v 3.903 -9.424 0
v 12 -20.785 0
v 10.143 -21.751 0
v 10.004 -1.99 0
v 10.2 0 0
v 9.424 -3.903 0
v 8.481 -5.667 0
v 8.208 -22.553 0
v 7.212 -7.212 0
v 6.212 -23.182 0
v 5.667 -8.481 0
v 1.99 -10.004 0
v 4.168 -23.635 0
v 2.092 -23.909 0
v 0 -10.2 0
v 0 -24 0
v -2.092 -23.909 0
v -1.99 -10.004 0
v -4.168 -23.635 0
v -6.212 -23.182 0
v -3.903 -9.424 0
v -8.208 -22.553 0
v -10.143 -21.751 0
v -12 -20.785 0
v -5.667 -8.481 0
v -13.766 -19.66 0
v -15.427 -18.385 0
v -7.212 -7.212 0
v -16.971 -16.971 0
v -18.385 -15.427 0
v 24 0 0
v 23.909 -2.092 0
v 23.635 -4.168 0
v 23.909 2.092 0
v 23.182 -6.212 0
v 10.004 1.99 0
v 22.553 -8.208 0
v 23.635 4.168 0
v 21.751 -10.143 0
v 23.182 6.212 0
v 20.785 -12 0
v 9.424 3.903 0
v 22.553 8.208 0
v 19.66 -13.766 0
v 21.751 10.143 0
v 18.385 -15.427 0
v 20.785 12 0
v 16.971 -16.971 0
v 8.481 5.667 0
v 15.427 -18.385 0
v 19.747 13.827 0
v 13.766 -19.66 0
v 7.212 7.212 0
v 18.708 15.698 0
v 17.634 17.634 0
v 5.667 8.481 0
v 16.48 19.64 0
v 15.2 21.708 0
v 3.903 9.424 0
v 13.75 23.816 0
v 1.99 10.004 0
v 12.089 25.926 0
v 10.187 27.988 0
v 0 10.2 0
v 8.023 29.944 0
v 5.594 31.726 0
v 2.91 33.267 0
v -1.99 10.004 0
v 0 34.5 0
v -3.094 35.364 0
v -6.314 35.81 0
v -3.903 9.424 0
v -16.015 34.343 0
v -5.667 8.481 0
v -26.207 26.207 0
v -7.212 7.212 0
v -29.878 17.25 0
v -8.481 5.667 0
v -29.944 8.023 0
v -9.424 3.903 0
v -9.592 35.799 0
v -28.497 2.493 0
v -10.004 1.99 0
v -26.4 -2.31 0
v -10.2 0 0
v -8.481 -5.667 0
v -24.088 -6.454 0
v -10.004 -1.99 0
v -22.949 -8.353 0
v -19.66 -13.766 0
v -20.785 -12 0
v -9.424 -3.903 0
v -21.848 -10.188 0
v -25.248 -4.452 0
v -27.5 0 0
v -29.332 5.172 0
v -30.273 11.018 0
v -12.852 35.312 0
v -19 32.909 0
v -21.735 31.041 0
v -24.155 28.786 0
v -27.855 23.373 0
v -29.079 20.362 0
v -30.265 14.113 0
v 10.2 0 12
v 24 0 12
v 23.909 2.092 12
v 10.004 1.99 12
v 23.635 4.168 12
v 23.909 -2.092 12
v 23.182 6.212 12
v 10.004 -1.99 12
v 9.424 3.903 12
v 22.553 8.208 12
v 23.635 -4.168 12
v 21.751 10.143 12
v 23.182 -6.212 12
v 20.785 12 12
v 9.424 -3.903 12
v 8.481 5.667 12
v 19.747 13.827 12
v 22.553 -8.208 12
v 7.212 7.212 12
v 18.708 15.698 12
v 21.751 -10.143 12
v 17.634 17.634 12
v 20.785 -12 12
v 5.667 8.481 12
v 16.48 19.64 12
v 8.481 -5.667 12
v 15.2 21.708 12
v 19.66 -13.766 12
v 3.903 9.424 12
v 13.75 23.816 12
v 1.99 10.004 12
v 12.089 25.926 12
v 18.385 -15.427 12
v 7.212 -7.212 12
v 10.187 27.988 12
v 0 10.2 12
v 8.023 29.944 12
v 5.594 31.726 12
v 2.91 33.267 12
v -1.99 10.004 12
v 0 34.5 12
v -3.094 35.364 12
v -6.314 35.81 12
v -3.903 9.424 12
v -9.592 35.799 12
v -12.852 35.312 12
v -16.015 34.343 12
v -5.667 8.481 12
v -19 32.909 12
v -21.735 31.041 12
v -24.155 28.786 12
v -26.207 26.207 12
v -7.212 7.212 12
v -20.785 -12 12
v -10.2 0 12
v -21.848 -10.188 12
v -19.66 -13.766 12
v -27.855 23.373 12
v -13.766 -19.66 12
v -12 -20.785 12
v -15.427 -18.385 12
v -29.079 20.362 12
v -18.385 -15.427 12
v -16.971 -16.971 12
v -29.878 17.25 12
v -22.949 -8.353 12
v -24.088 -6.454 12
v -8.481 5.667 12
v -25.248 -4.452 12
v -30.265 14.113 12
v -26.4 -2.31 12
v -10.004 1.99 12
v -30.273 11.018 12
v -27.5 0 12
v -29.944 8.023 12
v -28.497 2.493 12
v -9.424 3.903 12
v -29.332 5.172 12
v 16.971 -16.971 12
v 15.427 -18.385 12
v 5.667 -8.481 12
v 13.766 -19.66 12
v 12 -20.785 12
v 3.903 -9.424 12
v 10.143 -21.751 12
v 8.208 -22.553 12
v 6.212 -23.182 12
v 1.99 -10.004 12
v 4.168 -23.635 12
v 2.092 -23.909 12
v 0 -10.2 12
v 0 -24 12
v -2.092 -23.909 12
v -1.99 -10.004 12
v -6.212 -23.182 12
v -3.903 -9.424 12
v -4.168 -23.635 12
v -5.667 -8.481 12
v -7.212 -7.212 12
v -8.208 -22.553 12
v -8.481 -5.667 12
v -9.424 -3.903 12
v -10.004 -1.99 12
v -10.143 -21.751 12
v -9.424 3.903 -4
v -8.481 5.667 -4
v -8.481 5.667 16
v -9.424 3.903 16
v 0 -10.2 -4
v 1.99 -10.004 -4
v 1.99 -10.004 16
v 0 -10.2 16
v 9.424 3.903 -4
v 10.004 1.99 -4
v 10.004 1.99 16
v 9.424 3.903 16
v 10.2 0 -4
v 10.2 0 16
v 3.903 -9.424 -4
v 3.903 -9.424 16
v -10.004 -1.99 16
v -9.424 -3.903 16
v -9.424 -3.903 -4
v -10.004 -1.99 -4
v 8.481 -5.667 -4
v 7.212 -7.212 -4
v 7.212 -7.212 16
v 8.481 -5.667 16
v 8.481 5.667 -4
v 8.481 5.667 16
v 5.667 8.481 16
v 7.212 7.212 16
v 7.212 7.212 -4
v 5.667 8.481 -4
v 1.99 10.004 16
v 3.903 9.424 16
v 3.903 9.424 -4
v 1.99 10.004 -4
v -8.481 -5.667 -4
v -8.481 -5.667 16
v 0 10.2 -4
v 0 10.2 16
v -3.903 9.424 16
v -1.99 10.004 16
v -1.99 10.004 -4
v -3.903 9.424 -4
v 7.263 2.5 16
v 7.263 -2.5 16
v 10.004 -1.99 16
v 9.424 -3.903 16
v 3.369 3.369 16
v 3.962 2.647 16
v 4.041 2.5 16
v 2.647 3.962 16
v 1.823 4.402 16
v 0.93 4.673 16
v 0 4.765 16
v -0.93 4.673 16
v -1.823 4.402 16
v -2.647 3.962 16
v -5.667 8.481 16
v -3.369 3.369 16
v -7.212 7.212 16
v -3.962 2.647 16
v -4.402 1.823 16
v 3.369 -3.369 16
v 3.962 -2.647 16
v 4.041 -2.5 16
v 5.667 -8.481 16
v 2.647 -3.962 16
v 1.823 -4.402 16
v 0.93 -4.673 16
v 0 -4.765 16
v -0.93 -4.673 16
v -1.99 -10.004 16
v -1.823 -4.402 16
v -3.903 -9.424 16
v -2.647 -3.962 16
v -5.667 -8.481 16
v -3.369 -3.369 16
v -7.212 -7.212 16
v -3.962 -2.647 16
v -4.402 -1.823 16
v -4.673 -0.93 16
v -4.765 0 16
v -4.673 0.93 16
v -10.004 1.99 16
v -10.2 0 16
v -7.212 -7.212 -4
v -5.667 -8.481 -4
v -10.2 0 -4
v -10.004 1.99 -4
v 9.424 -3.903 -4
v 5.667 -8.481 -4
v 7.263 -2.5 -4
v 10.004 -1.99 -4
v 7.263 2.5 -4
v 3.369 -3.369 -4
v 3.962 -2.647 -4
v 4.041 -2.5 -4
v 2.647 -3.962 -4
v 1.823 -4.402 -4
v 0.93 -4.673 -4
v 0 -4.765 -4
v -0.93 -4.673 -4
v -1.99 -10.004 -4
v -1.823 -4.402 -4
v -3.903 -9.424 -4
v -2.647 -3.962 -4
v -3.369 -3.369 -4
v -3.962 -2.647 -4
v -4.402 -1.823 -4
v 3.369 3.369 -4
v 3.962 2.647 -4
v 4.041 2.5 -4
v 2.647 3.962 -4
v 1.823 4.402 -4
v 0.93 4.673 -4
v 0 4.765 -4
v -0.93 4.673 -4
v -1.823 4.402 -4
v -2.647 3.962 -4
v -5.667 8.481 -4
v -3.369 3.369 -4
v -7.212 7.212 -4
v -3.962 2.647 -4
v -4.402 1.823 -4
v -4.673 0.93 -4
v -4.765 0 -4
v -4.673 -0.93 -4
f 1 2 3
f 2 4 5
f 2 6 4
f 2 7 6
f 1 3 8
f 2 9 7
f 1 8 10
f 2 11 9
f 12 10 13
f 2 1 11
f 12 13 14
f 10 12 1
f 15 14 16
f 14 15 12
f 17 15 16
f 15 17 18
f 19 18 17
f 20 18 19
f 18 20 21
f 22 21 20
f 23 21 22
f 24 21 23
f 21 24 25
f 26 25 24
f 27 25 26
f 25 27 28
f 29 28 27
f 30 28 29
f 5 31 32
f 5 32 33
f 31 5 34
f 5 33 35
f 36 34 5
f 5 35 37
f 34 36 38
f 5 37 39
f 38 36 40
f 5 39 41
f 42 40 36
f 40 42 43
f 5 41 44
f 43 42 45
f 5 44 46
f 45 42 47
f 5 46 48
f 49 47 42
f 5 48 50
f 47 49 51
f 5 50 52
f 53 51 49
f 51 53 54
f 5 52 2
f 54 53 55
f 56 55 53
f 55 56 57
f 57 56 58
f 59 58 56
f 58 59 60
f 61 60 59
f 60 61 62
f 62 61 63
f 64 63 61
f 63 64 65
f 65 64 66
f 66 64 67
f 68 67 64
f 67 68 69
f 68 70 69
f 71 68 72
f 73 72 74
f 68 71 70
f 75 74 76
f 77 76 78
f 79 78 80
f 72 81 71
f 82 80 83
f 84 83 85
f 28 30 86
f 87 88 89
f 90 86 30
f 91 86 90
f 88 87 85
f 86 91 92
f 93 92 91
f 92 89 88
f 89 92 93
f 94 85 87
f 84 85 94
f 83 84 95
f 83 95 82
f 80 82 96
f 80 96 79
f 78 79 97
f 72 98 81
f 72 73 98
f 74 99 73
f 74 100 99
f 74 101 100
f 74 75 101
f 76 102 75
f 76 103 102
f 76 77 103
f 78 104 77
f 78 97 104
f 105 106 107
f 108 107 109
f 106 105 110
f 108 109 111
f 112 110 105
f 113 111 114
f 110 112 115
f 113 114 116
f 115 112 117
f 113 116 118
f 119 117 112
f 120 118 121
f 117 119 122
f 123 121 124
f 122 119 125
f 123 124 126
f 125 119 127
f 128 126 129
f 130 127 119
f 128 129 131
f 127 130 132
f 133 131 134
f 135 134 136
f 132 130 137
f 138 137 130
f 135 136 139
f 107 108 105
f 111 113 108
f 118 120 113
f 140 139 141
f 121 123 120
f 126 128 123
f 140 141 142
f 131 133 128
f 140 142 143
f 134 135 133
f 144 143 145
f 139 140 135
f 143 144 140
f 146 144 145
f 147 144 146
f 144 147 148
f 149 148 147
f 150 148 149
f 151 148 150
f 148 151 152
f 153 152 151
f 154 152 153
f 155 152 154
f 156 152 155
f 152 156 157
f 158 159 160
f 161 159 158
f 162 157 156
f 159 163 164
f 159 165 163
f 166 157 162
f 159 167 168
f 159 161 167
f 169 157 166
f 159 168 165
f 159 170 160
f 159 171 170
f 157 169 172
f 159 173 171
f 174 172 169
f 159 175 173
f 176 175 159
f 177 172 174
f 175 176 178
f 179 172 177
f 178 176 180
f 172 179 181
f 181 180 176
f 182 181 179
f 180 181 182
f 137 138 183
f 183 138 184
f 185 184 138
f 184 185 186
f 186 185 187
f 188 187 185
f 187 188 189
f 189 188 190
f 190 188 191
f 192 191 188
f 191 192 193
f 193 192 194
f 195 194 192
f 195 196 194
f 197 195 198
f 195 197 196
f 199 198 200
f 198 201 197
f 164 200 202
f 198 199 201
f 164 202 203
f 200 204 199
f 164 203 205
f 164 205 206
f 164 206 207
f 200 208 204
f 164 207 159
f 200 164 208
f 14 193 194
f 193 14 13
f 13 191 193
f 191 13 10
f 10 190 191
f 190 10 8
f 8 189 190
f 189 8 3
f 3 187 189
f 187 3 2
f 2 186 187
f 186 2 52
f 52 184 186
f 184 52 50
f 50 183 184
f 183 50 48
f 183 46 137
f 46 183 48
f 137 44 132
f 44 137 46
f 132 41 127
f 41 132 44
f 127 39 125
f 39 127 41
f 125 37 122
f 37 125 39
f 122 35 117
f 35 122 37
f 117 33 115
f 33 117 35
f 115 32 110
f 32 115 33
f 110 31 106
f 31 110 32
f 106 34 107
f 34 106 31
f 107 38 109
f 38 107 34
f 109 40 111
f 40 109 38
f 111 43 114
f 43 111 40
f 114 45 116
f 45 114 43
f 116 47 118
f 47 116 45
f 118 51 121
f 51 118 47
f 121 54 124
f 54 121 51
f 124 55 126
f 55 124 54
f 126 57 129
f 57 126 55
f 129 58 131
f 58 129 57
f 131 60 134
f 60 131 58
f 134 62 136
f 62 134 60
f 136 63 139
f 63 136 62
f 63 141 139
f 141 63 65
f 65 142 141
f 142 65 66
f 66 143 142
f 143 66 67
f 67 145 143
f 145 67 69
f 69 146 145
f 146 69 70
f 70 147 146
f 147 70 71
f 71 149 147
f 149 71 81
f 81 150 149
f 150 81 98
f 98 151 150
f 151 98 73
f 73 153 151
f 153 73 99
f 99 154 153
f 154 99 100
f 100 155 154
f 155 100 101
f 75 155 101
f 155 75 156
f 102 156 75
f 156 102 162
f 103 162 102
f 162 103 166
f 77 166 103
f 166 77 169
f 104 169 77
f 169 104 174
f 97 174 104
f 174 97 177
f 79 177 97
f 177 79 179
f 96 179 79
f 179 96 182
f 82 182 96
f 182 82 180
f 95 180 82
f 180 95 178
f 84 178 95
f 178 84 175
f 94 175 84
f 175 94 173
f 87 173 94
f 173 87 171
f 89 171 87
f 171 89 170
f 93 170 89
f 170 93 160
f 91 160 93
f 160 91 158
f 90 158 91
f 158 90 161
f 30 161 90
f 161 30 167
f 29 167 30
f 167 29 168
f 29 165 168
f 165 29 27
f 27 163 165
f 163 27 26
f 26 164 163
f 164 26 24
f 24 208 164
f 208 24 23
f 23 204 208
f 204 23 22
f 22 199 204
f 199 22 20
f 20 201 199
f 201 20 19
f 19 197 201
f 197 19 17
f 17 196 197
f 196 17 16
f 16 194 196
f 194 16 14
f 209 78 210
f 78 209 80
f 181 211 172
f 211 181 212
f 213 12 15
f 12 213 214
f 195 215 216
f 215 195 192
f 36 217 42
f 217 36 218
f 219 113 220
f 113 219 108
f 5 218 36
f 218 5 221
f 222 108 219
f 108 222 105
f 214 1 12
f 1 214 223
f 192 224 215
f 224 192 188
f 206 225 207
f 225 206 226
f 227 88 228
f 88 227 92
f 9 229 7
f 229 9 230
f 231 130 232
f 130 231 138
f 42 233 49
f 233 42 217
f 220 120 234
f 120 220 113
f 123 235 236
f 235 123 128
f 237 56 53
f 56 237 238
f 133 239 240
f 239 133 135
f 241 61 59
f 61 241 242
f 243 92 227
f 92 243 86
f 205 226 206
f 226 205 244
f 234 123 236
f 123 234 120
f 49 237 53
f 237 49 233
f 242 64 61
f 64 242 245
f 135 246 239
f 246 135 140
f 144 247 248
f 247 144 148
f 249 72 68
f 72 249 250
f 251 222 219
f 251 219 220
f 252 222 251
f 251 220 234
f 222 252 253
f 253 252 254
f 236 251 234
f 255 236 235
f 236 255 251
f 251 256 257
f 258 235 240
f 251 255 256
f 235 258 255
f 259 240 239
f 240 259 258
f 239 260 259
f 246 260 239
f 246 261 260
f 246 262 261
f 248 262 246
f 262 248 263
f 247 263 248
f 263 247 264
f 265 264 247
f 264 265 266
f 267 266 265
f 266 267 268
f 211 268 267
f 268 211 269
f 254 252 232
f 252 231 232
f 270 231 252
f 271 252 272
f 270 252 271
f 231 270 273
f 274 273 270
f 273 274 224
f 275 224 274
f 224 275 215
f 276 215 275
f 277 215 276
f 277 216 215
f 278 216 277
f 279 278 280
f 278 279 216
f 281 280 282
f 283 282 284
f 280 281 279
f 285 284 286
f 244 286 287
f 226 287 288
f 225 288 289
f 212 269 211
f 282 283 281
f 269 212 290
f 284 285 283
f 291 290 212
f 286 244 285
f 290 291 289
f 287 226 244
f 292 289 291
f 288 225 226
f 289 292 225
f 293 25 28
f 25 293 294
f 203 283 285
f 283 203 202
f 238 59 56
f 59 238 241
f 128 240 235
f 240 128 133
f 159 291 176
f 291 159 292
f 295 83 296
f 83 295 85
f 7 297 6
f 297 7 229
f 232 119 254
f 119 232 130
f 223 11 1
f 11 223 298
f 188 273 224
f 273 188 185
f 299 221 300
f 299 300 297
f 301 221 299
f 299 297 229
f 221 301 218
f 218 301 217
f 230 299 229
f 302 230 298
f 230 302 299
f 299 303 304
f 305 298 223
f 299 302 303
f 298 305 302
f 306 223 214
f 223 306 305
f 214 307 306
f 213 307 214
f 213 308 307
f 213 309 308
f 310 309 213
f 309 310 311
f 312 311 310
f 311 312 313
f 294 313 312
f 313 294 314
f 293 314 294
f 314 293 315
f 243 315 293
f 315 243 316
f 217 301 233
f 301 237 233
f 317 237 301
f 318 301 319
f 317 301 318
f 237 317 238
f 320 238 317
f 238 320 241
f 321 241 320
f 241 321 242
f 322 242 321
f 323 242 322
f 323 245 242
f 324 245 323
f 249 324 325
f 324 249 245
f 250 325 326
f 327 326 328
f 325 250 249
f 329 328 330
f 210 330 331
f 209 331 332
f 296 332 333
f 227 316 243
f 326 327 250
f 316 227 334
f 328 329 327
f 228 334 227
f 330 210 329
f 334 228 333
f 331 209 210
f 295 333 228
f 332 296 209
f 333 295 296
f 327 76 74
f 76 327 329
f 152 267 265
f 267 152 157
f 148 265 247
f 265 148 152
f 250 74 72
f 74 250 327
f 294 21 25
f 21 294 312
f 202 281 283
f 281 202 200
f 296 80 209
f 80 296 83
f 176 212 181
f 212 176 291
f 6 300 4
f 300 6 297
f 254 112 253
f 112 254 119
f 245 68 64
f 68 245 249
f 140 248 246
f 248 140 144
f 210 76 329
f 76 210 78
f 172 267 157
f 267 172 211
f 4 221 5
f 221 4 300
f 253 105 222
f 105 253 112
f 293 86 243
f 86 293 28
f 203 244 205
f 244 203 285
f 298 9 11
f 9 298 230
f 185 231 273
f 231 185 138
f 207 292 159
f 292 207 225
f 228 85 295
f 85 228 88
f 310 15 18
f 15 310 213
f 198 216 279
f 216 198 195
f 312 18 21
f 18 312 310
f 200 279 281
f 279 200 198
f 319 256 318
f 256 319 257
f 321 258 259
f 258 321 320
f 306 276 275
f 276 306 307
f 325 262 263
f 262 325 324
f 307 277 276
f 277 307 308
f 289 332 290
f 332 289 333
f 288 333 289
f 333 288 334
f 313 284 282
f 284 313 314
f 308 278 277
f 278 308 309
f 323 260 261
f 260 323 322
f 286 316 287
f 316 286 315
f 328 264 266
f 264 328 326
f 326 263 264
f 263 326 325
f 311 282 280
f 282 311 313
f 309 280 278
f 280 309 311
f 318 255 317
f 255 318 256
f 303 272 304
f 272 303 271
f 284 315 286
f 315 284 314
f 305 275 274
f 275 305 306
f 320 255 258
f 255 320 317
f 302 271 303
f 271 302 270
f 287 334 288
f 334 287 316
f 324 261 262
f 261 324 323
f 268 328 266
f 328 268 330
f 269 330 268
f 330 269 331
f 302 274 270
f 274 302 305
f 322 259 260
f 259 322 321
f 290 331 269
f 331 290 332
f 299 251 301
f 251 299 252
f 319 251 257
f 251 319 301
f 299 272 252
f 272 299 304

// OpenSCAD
$fn = 32;

// ----------------------------------------------------------------------
// Cam: base radius 24 mm with a 14 mm lift over 180 degrees
// ----------------------------------------------------------------------

// --- parameters (mm) ---
base_r = 24;              // base radius
lift = 14;                // lift height above the base radius
lift_span = 180;          // angular width of the lift
lift_start = 30;          // angle where the lift starts
cam_t = 12;               // cam plate thickness
hub_d = 20.4;             // hub diameter
hub_h = 20;               // hub height
bore_d = 9.53;            // bore
key_w = 5;                // keyway width
key_depth = 2.5;          // keyway depth

cam_profile = [[24, 0], [23.909, 2.092], [23.635, 4.168], [23.182, 6.212], [22.553, 8.208], [21.751, 10.143], [20.785, 12], [19.747, 13.827], [18.708, 15.698], [17.634, 17.634], [16.48, 19.64], [15.2, 21.708], [13.75, 23.816], [12.089, 25.926], [10.187, 27.988], [8.023, 29.944], [5.594, 31.726], [2.91, 33.267], [0, 34.5], [-3.094, 35.364], [-6.314, 35.81], [-9.592, 35.799], [-12.852, 35.312], [-16.015, 34.343], [-19, 32.909], [-21.735, 31.041], [-24.155, 28.786], [-26.207, 26.207], [-27.855, 23.373], [-29.079, 20.362], [-29.878, 17.25], [-30.265, 14.113], [-30.273, 11.018], [-29.944, 8.023], [-29.332, 5.172], [-28.497, 2.493], [-27.5, 0], [-26.4, -2.31], [-25.248, -4.452], [-24.088, -6.454], [-22.949, -8.353], [-21.848, -10.188], [-20.785, -12], [-19.66, -13.766], [-18.385, -15.427], [-16.971, -16.971], [-15.427, -18.385], [-13.766, -19.66], [-12, -20.785], [-10.143, -21.751], [-8.208, -22.553], [-6.212, -23.182], [-4.168, -23.635], [-2.092, -23.909], [0, -24], [2.092, -23.909], [4.168, -23.635], [6.212, -23.182], [8.208, -22.553], [10.143, -21.751], [12, -20.785], [13.766, -19.66], [15.427, -18.385], [16.971, -16.971], [18.385, -15.427], [19.66, -13.766], [20.785, -12], [21.751, -10.143], [22.553, -8.208], [23.182, -6.212], [23.635, -4.168], [23.909, -2.092]];

difference() {
  union() {
    linear_extrude(height = cam_t) polygon(cam_profile);
    /* hub, proud of the cam plate on both sides */
    translate([0, 0, -4]) cylinder(h = hub_h, d = hub_d);
  }
  /* bore through the hub, 2.5 mm clear on both faces */
  translate([0, 0, -6.5]) cylinder(h = hub_h + 5, d = bore_d);
  /* keyway, milled through the whole hub */
  translate([2.263, -2.5, -6.5]) cube([5, 5, 25]);
}
